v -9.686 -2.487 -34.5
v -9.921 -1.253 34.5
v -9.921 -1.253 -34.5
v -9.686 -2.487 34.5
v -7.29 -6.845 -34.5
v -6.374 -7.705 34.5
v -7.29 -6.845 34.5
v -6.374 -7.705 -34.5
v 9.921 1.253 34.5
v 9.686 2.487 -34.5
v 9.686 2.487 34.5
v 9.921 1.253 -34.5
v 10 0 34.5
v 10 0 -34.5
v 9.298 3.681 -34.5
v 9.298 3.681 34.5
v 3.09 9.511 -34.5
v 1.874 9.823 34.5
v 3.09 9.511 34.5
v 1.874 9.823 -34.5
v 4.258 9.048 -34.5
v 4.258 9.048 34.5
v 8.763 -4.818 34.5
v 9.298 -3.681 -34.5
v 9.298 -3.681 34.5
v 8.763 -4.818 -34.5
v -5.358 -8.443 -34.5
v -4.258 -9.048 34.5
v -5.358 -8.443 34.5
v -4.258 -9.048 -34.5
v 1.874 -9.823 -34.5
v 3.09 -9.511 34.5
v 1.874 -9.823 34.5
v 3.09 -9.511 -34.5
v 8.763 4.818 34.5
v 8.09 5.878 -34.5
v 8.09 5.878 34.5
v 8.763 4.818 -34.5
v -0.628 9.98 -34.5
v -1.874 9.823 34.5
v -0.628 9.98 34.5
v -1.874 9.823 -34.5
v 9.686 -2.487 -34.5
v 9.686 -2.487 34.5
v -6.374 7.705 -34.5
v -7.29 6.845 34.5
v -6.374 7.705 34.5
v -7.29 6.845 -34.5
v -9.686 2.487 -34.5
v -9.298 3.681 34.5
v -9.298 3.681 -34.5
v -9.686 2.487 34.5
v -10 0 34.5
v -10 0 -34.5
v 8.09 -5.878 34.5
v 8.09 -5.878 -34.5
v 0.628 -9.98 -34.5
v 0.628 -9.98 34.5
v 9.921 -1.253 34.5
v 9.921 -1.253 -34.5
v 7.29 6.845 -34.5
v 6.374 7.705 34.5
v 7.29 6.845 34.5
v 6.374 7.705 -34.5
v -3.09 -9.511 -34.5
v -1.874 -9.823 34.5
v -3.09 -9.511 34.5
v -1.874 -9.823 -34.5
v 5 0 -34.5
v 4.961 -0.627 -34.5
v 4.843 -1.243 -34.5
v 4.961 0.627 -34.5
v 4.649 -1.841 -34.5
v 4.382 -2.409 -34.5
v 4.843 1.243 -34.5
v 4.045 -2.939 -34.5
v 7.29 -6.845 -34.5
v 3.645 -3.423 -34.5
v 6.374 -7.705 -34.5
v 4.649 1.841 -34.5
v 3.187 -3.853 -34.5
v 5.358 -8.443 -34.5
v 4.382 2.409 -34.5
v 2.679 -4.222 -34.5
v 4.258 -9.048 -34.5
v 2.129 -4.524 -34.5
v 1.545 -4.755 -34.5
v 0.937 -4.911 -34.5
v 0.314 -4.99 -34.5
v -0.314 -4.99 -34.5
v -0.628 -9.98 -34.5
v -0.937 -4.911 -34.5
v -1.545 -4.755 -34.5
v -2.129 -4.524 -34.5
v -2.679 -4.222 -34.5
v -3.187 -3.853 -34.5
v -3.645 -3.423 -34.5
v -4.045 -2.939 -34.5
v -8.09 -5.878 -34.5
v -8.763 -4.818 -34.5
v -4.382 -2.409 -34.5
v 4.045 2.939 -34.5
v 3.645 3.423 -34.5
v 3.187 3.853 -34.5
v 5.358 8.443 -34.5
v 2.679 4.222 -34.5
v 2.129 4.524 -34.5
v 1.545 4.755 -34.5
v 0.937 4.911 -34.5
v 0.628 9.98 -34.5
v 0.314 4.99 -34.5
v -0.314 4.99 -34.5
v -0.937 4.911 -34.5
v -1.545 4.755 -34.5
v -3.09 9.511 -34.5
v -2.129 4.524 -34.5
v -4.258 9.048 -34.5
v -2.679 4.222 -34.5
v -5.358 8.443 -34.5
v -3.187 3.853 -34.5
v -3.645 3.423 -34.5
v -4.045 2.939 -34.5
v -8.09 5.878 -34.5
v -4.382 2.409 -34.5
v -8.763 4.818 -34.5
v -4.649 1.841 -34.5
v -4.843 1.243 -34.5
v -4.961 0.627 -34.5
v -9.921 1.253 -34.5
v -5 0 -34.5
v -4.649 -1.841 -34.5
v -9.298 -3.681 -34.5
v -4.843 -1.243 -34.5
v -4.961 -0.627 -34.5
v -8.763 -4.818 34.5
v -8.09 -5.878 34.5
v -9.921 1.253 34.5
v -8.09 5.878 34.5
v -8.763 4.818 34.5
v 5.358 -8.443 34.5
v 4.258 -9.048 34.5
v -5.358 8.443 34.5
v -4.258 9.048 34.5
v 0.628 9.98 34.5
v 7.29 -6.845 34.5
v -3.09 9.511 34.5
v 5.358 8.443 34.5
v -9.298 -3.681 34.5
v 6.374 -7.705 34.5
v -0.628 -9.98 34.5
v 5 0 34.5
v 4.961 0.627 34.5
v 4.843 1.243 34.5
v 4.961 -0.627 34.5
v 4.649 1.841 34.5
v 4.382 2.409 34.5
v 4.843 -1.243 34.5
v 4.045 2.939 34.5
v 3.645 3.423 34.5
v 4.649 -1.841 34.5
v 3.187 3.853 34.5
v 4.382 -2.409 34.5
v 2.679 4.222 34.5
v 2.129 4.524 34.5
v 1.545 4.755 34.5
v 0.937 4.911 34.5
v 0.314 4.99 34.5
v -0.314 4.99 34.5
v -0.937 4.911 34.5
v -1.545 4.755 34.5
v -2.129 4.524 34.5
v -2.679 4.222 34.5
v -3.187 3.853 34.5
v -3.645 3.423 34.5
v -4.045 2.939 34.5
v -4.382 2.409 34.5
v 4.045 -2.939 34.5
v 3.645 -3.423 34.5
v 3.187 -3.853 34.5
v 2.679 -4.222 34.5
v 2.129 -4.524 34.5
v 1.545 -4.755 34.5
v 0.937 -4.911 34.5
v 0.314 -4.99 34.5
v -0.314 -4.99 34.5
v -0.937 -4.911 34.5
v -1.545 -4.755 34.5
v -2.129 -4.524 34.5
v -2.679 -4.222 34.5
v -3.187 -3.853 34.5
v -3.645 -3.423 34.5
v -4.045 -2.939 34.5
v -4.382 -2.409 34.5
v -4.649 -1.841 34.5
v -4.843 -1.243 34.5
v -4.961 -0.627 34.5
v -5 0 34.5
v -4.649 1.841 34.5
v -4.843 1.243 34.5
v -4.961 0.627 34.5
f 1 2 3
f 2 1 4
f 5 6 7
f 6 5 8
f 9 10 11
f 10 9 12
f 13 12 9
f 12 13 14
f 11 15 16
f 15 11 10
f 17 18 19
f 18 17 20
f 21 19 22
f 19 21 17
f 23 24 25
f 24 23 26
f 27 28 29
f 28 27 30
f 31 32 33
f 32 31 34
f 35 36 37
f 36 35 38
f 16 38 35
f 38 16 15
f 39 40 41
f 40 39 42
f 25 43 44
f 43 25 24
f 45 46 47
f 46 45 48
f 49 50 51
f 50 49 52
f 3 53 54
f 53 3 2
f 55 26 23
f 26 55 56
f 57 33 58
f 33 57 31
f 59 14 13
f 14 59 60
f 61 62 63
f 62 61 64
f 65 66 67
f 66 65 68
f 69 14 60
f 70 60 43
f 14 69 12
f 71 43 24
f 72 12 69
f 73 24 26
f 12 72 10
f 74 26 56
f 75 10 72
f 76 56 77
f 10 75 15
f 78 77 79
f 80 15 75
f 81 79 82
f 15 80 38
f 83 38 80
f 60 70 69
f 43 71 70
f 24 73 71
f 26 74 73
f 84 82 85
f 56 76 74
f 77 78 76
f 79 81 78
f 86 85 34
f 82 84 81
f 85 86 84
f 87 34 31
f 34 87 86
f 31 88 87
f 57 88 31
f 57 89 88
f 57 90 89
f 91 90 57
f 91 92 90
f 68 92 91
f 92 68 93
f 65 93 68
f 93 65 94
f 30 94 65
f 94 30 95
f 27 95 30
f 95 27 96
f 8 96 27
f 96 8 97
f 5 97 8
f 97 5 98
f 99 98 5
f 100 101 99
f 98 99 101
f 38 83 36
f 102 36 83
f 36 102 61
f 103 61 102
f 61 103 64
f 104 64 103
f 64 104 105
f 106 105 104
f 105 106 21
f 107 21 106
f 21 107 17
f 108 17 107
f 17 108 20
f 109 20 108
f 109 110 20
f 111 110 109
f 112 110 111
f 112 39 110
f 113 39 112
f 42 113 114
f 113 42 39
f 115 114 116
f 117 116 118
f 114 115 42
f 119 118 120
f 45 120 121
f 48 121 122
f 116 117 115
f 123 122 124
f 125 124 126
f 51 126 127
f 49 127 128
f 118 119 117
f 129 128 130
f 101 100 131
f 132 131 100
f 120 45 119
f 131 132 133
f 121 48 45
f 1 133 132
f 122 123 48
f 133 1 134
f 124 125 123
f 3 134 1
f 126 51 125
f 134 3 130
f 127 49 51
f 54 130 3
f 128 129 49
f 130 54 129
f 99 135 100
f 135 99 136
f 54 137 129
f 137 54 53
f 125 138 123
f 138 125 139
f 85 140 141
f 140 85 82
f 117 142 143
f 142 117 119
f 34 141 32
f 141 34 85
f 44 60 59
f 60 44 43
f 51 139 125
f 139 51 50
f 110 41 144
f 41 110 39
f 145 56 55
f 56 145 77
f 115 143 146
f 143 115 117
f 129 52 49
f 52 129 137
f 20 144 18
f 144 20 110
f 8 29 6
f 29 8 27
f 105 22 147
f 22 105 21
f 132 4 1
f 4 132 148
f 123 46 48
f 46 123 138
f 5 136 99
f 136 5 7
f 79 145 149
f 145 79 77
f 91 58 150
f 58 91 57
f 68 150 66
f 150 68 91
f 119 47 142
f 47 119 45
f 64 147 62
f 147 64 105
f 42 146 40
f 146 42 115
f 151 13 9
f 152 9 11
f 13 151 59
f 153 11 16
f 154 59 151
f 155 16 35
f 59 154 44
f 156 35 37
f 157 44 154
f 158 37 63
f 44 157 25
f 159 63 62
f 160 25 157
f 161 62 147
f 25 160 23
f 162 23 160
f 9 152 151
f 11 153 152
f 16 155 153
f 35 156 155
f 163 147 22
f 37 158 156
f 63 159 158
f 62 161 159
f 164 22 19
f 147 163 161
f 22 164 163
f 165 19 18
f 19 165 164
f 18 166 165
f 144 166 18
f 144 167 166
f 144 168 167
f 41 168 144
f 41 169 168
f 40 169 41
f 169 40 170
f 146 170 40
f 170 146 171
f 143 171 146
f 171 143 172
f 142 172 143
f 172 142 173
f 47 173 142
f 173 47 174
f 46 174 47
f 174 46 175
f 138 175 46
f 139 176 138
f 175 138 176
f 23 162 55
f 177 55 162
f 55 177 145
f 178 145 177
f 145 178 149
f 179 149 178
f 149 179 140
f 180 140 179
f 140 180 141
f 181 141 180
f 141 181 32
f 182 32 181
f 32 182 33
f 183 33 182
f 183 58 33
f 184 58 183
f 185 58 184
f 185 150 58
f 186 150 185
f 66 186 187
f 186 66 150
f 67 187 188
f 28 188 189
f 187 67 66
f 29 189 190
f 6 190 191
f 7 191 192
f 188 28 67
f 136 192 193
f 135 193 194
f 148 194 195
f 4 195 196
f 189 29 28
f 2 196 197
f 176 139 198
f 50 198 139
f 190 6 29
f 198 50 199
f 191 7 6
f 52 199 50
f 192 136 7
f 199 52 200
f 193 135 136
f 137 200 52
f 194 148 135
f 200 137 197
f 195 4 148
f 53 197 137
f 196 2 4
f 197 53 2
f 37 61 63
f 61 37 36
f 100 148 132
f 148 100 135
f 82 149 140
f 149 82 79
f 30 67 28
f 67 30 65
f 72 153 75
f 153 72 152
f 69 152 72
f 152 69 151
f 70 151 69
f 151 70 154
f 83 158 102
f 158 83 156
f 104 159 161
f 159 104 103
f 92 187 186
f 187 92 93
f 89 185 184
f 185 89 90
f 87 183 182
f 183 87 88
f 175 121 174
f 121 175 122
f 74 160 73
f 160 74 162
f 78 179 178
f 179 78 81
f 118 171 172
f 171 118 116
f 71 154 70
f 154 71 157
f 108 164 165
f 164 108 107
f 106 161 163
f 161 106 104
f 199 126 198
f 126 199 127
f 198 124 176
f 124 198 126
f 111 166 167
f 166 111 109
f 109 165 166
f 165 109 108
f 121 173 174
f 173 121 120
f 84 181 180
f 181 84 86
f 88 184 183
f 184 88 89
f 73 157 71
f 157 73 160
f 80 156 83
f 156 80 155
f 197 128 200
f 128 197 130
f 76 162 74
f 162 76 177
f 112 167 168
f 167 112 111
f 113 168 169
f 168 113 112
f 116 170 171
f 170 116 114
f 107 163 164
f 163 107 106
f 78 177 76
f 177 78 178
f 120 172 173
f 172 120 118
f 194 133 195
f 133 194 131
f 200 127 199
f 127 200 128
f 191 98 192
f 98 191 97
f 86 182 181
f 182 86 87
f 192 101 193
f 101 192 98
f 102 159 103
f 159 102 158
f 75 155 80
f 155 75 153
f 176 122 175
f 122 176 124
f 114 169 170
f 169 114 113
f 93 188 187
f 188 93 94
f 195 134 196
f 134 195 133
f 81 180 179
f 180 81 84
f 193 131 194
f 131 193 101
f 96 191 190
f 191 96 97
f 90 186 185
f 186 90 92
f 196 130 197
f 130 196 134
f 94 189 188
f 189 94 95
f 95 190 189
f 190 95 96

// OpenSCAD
$fn = 50;


difference() {
	union() {
		translate(v = [0, 0, -34.5000000000]) {
			cylinder(h = 69, r = 10.0000000000);
		}
	}
	union() {
		translate(v = [0, 0, -100.0000000000]) {
			cylinder(h = 200, r = 5.0000000000);
		}
	}
}
